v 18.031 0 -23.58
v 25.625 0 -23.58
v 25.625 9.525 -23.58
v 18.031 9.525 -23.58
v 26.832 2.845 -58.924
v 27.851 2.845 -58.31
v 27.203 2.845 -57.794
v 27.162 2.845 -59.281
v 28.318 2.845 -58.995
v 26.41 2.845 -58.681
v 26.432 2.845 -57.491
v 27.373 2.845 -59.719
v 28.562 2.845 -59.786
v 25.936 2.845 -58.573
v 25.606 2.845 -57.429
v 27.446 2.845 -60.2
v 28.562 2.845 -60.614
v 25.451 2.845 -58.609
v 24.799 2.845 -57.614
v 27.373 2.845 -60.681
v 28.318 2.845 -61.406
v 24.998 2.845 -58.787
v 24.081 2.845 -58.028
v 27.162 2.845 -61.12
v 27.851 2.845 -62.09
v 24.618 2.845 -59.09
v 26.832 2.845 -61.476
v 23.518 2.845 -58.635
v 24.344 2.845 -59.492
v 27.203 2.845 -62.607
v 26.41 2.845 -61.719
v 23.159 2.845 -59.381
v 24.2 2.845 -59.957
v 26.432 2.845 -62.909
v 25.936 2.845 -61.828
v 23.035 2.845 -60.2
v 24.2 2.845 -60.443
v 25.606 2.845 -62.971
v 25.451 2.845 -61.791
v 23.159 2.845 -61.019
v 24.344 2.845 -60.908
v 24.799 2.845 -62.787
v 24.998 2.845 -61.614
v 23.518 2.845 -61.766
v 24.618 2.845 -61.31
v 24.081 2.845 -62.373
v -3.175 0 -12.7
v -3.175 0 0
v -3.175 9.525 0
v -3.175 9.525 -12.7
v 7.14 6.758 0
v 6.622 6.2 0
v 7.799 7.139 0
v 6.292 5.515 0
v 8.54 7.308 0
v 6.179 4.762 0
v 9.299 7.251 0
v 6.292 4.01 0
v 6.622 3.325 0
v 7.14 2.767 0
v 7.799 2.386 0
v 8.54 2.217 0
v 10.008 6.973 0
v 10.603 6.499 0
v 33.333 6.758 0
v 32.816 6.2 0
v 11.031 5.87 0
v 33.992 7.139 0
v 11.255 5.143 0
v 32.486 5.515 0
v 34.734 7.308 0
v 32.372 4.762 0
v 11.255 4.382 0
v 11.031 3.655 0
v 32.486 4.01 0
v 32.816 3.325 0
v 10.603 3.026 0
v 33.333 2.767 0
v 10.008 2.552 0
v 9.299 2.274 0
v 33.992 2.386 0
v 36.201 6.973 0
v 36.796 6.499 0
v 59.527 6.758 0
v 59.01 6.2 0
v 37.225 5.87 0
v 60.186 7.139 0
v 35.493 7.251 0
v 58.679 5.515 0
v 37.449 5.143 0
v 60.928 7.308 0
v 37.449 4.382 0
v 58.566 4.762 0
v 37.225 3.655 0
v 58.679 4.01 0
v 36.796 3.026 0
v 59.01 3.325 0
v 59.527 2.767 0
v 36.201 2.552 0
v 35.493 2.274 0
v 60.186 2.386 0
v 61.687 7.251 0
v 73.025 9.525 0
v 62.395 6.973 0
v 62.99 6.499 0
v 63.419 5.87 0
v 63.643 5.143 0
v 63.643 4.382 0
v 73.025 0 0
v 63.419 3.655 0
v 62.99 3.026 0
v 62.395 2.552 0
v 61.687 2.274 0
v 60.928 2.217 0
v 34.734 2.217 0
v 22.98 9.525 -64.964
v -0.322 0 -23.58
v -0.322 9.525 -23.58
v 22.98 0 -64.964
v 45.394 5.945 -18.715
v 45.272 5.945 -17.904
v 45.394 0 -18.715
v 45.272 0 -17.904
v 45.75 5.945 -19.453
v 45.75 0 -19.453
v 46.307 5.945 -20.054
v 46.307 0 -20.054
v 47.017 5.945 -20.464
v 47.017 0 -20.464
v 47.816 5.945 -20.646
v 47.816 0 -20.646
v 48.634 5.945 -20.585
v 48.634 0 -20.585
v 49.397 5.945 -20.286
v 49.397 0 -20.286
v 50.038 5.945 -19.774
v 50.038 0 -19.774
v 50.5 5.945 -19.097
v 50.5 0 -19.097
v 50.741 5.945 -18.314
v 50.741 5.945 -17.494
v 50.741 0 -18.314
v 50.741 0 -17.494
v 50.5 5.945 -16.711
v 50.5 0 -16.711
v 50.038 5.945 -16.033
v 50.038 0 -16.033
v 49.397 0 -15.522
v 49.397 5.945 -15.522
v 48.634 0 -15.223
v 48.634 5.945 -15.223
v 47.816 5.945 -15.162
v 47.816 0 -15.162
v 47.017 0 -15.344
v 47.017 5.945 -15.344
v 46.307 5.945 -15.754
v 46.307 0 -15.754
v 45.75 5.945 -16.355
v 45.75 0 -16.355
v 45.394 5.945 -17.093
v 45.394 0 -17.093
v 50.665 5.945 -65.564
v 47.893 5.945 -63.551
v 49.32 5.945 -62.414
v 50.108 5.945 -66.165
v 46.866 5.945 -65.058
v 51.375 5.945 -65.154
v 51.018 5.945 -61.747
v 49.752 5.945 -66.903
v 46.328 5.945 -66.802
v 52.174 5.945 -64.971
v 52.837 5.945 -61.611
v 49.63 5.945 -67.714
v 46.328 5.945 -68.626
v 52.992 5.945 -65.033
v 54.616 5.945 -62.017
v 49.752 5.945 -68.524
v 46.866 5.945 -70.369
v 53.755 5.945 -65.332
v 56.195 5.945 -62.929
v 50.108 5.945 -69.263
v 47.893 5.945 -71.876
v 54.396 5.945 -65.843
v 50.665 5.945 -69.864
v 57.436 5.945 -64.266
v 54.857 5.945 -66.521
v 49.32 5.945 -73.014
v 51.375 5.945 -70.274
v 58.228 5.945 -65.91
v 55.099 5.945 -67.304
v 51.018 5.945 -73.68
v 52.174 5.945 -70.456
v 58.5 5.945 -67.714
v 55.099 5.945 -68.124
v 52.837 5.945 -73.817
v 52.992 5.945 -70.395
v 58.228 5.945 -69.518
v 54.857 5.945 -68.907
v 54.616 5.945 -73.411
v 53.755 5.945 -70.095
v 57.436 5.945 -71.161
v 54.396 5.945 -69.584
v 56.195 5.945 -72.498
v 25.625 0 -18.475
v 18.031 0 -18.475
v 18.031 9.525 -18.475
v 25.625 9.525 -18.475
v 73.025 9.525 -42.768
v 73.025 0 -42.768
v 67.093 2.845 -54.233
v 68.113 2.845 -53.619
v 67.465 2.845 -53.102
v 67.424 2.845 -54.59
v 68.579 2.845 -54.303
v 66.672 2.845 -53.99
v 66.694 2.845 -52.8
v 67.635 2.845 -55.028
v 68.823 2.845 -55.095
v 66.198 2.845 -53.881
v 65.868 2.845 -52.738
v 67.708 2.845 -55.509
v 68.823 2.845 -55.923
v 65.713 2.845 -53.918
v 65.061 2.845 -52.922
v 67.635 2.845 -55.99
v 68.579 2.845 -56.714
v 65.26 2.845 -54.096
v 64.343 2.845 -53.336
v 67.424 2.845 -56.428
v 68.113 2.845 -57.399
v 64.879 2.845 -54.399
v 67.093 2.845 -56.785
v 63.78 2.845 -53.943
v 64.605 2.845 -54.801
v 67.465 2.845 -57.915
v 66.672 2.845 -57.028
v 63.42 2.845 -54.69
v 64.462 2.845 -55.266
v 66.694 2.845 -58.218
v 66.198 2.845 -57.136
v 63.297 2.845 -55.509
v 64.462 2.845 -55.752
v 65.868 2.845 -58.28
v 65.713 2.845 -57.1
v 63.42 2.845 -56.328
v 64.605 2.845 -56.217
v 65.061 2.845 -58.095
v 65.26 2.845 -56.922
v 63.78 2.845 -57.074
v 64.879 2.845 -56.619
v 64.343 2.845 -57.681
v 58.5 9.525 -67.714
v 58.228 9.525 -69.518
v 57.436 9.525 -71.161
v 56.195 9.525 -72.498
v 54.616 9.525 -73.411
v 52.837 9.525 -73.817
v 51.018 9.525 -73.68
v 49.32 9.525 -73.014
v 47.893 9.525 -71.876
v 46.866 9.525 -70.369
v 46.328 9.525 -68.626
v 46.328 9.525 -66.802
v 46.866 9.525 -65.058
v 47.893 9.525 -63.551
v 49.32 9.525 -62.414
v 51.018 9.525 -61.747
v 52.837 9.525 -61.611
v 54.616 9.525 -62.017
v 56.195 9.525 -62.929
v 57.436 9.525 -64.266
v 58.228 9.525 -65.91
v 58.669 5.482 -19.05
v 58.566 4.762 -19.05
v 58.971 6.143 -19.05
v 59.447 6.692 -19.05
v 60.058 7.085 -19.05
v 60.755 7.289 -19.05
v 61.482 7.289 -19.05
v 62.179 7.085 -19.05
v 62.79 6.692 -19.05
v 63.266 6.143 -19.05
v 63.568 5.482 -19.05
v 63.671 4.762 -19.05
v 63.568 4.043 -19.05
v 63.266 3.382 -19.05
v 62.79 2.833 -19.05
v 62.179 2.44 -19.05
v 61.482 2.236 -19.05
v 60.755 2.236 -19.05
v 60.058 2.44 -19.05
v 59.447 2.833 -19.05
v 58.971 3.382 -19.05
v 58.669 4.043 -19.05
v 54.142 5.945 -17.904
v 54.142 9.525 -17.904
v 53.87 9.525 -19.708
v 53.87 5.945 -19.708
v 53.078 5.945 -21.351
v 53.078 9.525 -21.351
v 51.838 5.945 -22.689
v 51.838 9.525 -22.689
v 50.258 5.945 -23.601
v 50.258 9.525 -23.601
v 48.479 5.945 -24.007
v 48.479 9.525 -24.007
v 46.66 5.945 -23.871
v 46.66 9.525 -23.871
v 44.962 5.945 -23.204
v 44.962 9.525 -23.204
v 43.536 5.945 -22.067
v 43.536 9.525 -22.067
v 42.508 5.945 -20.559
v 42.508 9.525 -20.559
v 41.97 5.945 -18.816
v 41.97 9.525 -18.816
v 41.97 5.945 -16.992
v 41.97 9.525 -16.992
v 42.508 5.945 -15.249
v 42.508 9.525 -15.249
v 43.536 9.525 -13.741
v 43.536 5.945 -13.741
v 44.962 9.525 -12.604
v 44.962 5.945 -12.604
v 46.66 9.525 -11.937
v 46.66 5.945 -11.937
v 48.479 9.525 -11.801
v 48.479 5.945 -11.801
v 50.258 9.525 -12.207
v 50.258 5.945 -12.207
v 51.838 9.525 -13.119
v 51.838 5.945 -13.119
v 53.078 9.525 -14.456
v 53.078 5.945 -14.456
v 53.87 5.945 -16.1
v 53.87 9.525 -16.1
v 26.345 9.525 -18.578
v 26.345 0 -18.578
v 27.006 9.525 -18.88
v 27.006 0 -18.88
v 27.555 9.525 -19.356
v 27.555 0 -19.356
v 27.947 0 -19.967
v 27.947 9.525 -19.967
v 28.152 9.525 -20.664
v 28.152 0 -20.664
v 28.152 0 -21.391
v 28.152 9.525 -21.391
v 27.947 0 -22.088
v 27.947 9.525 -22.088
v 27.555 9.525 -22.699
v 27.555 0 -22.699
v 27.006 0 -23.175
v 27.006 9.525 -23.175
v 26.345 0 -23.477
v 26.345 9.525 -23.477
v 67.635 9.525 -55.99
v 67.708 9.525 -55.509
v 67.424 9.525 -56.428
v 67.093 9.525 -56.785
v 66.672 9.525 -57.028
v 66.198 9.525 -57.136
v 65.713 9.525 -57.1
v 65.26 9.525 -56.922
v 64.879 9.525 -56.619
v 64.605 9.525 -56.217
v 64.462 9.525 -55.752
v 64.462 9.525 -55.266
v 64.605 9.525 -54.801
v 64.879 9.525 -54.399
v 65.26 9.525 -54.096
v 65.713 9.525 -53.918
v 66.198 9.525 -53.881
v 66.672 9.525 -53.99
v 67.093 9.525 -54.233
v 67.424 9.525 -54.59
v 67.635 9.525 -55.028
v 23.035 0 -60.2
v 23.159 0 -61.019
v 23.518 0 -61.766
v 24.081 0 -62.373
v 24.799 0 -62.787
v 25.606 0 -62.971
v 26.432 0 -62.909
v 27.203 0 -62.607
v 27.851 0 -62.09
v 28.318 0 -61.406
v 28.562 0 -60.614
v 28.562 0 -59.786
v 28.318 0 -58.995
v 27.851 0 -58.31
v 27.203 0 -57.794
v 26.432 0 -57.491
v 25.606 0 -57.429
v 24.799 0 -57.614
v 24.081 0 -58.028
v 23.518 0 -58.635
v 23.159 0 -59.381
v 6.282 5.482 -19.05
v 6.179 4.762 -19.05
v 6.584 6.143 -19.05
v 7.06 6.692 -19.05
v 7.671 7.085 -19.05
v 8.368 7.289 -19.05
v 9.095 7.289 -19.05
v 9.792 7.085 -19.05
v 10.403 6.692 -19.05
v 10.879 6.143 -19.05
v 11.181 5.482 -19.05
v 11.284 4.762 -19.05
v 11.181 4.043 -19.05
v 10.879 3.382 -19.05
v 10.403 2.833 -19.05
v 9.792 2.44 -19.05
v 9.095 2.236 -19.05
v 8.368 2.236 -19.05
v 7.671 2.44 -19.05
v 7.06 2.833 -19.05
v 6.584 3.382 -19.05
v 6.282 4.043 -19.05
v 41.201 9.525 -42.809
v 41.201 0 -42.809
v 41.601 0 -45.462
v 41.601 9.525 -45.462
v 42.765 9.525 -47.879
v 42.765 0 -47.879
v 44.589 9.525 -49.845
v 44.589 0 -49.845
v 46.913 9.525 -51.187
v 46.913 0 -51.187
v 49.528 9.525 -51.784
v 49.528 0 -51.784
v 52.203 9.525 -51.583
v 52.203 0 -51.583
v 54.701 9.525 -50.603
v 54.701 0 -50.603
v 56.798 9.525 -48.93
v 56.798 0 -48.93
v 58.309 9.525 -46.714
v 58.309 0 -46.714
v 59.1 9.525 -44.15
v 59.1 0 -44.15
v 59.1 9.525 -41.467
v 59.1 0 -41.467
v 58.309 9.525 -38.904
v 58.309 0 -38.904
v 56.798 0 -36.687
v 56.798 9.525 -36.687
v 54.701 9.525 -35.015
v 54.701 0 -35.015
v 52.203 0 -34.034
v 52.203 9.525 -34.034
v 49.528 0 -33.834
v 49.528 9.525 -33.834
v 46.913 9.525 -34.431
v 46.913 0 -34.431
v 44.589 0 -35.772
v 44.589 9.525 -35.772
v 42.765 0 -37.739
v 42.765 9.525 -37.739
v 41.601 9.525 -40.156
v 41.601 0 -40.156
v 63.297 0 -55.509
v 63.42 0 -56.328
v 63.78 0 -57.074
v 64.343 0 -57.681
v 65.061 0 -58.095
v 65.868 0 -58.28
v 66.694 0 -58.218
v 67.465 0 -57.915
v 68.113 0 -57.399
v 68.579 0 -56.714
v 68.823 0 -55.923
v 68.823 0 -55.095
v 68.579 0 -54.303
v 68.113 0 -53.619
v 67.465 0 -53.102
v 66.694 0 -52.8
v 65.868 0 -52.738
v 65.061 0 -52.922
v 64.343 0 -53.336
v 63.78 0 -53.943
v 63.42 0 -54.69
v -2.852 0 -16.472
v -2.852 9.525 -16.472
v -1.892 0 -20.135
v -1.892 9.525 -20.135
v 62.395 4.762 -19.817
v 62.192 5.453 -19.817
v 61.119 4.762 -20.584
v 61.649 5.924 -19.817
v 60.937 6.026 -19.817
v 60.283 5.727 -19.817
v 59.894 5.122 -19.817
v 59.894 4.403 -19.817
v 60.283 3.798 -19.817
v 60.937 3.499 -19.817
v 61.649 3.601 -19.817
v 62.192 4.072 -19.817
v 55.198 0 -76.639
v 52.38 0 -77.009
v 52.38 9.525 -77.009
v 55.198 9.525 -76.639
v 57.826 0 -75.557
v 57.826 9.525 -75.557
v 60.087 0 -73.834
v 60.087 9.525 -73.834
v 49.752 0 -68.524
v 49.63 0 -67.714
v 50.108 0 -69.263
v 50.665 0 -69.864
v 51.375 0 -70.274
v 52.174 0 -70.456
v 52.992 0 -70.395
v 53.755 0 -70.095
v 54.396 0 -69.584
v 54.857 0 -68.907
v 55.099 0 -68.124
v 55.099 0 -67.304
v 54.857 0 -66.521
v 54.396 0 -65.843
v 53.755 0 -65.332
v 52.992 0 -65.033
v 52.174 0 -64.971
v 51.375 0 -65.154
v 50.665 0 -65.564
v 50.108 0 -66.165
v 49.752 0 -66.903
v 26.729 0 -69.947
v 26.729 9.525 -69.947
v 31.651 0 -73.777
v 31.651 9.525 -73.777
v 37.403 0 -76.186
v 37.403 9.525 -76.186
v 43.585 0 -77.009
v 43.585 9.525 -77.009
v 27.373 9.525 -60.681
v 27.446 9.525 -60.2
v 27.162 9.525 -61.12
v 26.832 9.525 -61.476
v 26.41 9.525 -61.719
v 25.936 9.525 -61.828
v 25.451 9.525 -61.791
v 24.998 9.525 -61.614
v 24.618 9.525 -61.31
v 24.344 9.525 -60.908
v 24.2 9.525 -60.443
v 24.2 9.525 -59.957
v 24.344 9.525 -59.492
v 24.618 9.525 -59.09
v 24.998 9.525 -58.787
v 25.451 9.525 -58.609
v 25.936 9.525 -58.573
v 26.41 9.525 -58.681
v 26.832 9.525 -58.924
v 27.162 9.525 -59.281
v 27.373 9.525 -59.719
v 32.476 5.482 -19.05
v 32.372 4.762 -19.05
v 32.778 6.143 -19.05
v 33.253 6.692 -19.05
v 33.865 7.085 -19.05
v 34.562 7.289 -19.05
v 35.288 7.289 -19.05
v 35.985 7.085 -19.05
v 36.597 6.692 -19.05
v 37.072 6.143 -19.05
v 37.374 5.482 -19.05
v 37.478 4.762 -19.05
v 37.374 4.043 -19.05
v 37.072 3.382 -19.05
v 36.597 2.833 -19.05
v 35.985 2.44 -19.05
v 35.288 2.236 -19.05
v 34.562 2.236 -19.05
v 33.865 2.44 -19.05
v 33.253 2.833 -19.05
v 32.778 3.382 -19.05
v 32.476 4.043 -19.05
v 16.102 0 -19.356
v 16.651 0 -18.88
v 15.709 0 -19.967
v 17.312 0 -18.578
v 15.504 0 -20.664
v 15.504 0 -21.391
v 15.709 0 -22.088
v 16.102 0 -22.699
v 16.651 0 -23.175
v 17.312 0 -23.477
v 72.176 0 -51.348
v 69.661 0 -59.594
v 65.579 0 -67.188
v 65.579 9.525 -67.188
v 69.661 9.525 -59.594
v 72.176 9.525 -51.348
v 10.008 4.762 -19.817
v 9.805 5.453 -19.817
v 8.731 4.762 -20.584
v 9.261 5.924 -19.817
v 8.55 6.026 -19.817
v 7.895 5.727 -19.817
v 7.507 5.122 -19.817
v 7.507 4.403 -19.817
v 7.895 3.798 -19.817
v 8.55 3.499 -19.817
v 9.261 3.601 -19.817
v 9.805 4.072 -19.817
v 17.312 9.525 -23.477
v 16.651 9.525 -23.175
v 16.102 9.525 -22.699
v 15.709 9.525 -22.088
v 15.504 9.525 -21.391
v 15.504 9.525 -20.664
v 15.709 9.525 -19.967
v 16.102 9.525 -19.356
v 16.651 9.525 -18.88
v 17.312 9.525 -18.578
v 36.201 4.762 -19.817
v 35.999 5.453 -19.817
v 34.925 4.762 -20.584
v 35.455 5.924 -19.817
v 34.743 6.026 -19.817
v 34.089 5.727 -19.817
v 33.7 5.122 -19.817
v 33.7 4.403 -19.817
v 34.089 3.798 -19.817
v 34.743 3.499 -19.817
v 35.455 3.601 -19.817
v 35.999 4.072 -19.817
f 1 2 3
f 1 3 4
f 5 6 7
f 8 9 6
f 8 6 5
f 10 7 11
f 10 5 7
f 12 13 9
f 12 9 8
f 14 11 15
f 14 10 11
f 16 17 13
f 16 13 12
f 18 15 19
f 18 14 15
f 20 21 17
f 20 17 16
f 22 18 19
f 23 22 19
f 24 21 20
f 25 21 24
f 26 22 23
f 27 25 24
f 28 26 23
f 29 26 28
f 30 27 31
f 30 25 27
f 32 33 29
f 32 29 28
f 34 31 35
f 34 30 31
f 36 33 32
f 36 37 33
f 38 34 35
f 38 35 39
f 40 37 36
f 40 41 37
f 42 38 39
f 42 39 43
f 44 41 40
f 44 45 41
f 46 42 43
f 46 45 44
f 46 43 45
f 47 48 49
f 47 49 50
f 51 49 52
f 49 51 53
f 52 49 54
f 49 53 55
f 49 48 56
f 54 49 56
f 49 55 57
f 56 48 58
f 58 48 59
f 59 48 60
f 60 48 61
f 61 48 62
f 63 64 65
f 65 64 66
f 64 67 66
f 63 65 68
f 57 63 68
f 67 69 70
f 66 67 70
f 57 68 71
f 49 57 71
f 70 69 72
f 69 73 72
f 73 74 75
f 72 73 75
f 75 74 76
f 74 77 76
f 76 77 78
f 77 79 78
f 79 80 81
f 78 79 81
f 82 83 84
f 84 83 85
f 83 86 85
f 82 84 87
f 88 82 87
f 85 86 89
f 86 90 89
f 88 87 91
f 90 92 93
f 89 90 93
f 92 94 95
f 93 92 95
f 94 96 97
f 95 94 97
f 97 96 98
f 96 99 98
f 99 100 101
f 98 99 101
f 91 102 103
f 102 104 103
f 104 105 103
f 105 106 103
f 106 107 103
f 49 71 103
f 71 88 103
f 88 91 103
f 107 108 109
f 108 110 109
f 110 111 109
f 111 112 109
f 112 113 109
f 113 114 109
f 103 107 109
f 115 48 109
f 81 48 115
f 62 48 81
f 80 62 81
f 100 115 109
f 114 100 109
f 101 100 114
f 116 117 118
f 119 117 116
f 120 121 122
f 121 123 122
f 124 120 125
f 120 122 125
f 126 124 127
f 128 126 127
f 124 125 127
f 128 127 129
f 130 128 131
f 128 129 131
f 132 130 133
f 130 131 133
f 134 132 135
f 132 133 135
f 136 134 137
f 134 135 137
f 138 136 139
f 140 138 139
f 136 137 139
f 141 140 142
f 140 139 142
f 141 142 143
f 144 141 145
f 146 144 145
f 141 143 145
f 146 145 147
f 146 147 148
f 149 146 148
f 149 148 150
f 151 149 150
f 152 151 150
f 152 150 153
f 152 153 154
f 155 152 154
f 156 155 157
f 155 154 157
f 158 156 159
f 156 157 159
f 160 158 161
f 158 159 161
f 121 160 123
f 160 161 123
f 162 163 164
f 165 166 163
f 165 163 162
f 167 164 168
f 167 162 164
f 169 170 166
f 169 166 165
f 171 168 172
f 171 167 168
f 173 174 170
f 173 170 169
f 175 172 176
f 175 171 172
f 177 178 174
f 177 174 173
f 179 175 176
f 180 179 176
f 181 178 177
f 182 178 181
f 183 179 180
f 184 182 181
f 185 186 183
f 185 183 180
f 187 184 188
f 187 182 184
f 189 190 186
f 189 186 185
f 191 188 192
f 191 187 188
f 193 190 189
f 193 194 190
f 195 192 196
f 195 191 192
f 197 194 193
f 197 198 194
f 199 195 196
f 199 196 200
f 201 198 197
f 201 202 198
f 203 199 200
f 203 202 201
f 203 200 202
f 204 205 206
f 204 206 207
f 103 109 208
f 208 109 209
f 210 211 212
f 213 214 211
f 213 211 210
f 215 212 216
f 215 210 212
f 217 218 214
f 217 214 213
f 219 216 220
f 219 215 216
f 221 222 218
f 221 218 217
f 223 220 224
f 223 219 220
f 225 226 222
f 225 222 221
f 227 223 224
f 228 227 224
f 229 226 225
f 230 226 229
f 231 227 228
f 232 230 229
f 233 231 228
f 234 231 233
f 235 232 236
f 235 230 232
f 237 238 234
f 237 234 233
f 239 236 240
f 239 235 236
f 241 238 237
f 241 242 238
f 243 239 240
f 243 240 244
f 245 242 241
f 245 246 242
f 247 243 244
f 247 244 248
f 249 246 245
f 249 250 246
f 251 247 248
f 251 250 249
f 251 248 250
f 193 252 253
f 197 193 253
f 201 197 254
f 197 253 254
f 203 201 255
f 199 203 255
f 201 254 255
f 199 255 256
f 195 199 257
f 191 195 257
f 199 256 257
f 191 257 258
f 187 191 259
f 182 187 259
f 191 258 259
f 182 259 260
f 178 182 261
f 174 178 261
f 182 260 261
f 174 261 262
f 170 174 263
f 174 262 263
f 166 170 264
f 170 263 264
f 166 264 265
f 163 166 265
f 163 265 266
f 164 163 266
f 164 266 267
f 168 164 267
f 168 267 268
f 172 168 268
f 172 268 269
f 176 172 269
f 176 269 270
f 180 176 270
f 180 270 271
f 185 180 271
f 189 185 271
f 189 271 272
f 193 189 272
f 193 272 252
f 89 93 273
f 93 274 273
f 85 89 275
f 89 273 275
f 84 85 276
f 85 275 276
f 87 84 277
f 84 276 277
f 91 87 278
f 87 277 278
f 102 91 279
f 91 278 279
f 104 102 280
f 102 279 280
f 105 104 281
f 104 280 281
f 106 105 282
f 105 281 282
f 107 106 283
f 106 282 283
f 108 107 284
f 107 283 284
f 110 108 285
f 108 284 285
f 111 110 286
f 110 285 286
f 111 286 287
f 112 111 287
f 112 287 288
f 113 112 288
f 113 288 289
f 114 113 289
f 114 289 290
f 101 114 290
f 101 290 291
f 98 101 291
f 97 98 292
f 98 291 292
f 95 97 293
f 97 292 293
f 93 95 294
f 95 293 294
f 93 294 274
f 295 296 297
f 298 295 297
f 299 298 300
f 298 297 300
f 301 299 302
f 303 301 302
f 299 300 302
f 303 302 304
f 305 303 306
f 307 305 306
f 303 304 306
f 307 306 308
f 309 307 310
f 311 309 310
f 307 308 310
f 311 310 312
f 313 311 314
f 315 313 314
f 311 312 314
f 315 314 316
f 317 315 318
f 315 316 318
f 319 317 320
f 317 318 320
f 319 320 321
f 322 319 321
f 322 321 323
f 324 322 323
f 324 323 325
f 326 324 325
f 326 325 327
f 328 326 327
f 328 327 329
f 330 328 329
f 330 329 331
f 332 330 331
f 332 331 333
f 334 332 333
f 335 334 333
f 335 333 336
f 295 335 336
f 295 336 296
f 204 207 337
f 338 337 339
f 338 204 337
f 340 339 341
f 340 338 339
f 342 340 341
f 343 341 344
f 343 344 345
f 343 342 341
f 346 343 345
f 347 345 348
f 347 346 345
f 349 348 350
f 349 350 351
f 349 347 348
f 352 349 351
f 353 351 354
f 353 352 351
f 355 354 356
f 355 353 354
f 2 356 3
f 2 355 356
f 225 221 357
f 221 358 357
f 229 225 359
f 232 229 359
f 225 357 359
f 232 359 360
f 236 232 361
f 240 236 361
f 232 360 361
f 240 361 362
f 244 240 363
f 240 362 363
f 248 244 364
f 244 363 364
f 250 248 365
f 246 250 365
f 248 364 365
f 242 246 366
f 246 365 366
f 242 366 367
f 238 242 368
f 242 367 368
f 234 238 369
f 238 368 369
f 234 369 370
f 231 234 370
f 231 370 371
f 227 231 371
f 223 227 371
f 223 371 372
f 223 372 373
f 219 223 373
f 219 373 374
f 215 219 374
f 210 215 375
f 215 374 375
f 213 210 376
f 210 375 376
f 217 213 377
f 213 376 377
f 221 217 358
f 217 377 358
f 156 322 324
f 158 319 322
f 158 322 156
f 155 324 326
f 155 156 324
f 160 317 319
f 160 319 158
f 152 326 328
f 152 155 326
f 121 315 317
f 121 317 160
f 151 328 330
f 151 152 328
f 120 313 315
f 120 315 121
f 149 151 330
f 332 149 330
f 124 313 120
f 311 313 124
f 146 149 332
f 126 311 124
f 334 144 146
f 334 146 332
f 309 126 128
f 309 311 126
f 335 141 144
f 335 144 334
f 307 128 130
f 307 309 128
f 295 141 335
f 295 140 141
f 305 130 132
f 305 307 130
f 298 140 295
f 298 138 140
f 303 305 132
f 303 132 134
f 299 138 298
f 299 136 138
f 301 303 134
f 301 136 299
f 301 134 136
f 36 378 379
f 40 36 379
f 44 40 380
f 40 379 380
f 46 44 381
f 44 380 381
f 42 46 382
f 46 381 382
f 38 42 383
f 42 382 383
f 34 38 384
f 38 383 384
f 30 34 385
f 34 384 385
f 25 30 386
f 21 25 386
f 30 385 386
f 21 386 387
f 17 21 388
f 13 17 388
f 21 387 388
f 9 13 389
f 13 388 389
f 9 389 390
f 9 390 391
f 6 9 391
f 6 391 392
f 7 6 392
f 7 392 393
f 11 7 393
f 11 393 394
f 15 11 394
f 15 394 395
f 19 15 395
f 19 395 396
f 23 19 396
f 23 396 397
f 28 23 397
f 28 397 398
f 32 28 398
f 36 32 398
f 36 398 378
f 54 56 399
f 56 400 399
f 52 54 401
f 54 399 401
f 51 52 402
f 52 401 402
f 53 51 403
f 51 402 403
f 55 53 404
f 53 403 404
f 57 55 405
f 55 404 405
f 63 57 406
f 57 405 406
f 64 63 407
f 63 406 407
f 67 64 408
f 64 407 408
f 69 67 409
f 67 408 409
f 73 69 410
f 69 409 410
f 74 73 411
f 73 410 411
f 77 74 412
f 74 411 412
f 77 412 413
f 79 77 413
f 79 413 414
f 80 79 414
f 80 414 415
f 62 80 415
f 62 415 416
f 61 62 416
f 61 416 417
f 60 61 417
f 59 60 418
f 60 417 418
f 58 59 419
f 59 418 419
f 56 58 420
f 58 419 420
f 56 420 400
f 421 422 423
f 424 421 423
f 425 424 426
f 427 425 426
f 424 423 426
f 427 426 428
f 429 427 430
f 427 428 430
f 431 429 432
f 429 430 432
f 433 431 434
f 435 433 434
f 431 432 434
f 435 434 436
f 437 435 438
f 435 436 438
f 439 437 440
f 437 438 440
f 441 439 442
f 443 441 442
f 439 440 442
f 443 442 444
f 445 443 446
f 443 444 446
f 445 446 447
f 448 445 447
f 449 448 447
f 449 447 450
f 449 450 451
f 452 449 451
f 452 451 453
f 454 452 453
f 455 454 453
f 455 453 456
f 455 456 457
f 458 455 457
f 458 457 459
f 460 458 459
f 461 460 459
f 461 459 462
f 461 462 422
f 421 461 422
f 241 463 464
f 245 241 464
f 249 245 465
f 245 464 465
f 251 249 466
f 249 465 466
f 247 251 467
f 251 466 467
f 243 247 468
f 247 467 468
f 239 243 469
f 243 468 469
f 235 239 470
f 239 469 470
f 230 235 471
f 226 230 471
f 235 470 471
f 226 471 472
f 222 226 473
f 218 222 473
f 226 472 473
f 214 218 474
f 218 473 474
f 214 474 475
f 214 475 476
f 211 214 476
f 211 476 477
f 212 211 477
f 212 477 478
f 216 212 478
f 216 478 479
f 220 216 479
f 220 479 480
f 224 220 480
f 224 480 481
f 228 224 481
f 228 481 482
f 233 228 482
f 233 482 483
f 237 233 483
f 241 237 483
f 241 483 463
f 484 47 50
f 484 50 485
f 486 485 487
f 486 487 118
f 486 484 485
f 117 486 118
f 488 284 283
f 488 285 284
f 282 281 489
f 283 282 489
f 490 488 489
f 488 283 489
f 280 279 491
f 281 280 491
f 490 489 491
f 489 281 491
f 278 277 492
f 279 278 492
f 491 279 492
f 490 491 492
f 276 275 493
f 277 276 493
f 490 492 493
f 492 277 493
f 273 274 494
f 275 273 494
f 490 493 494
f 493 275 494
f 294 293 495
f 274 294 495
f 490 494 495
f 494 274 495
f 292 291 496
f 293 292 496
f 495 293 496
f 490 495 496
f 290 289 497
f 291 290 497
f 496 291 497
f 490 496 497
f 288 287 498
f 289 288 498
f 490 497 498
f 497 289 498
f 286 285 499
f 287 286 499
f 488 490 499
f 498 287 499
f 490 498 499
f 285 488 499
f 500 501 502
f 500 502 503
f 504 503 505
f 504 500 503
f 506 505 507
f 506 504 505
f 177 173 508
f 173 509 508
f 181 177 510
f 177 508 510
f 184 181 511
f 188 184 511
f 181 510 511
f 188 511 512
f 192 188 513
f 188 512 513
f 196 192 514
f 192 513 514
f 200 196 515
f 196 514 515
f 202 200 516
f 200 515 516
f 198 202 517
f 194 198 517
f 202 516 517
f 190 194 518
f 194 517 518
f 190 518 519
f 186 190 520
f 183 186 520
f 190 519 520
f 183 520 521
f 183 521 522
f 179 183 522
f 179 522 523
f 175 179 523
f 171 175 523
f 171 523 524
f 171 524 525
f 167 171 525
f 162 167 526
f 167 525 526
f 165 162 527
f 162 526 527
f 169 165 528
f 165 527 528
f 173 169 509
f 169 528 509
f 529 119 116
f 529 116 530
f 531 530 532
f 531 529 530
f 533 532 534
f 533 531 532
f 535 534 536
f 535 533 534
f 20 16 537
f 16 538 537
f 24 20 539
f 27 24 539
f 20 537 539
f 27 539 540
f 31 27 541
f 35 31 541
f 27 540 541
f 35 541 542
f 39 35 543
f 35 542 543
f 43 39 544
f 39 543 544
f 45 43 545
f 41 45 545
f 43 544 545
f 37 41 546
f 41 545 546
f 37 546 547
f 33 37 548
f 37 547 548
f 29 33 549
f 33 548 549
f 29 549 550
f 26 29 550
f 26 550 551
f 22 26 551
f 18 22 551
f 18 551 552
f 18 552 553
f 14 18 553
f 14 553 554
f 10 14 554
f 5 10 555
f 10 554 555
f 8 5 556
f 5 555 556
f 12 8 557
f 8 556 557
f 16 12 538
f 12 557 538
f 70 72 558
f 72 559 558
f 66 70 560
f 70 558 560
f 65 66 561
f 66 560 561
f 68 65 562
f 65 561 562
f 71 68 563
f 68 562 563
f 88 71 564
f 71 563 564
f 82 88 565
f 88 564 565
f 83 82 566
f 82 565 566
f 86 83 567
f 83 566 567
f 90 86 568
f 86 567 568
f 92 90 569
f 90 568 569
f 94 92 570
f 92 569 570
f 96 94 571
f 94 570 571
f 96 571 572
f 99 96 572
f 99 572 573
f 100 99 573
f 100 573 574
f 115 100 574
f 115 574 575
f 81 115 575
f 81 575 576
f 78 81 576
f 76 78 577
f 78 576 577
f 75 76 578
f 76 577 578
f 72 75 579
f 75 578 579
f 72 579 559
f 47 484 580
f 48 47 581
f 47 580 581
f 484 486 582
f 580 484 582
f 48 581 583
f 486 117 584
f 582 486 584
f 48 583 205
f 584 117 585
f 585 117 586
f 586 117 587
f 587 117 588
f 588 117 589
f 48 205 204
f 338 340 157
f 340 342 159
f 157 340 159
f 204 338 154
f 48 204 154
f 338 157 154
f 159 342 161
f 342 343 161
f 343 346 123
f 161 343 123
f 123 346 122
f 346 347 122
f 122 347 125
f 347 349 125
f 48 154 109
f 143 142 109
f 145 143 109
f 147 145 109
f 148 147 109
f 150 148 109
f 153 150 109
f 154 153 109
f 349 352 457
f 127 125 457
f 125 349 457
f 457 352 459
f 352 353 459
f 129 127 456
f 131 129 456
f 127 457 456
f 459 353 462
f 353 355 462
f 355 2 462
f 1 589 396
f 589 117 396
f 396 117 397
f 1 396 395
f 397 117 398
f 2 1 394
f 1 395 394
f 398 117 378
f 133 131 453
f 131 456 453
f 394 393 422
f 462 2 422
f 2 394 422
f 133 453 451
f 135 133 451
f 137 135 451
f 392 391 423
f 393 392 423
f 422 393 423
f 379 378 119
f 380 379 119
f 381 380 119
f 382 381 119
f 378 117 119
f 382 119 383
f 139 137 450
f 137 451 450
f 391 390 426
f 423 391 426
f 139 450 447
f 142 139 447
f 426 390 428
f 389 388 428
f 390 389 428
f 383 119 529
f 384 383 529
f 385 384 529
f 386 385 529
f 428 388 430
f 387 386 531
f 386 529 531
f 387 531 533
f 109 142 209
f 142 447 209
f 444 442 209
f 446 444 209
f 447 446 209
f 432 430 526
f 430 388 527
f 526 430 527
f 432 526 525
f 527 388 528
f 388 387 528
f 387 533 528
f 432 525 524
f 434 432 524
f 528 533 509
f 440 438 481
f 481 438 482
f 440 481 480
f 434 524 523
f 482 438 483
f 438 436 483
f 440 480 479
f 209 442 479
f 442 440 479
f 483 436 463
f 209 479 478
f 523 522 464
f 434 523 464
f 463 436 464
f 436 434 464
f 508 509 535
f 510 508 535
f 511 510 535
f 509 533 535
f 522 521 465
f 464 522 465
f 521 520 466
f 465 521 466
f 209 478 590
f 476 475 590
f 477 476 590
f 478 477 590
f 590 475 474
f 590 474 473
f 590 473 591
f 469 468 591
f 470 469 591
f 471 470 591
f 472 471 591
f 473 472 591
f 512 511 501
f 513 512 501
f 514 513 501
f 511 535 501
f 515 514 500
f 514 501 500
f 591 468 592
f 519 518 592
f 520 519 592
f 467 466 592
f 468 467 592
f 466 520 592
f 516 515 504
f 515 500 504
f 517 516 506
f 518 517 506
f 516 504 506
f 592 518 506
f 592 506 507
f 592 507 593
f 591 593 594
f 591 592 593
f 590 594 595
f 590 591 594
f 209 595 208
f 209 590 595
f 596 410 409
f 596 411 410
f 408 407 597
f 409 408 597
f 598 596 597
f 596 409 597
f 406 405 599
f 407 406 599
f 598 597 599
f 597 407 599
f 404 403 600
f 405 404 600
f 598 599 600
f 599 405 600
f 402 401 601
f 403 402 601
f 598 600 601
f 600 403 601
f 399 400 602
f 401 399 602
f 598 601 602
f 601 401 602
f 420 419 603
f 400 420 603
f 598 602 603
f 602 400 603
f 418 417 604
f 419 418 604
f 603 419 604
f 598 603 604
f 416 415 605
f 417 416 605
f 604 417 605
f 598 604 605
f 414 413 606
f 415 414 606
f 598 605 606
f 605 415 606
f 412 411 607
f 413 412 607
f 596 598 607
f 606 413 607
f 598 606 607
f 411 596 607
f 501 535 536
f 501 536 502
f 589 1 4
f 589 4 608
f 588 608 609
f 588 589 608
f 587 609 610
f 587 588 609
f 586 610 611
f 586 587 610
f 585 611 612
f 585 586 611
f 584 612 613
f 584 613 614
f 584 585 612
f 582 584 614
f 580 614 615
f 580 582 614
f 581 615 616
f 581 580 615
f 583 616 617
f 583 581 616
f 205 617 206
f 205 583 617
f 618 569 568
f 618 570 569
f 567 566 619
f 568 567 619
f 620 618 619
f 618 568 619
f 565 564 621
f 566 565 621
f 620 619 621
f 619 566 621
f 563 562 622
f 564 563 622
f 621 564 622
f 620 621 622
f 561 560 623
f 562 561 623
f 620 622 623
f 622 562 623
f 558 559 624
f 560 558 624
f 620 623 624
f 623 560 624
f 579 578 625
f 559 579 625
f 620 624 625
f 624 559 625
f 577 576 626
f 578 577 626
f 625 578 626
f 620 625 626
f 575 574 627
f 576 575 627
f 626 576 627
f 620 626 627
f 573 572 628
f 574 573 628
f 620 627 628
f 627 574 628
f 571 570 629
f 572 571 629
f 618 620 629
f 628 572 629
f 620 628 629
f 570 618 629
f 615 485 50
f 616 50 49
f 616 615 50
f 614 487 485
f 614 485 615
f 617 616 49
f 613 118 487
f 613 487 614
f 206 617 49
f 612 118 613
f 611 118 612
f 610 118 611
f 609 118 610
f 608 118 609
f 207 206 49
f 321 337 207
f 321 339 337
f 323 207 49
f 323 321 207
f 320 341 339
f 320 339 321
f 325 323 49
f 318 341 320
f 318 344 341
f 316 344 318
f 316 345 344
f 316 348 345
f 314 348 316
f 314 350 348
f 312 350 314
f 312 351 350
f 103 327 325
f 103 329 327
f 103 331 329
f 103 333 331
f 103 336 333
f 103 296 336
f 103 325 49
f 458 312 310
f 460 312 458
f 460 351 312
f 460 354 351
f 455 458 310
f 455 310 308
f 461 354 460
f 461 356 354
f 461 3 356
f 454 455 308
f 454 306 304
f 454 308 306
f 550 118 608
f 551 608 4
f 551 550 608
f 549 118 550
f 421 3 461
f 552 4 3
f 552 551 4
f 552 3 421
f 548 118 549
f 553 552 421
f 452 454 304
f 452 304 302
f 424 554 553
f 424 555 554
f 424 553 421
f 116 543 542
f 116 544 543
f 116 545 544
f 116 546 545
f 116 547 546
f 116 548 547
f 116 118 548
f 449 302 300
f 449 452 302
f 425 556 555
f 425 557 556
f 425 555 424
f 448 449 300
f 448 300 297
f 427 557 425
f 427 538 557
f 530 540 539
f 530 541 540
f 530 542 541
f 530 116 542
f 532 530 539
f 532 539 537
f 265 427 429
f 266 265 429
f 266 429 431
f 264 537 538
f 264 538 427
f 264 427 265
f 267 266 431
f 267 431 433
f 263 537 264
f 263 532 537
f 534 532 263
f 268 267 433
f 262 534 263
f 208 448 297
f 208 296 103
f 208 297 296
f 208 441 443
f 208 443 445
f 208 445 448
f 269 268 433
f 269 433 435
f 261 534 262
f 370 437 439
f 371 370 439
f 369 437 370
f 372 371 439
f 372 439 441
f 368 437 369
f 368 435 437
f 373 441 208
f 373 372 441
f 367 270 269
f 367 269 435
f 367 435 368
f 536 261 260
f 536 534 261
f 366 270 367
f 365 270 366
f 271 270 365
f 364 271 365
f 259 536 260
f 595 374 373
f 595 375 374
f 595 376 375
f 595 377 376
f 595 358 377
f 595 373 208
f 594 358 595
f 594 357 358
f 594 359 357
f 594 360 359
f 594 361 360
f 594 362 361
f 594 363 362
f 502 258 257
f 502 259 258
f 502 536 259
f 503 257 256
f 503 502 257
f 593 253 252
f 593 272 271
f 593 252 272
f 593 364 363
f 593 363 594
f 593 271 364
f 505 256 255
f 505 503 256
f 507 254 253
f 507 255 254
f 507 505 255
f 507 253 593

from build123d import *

# Parameters (mm, degrees)
SKETCH1_W                                      = 69.85
SKETCH1_H                                      = 101.6
BOSS_EXTRUDE1_DEPTH                            = 9.525
F_1_4_20_TAPPED_HOLE1_D                        = 5.1054
F_1_4_20_TAPPED_HOLE1_DEPTH                    = 19.05
F_1_4_20_TAPPED_HOLE1_TIP                      = 1.533816902
F_18_0_18_DIAMETER_HOLE1_D                     = 18
CBORE_FOR_M5_HEX_HEAD_BOLT1_D                  = 5.5
CBORE_FOR_M5_HEX_HEAD_BOLT1_CBORE_D            = 12.24
CBORE_FOR_M5_HEX_HEAD_BOLT1_CBORE_DEPTH        = 3.58
CBORE_FOR_4_SOCKET_HEAD_CAP_SCREW1_D           = 3.2639
CBORE_FOR_4_SOCKET_HEAD_CAP_SCREW1_CBORE_D     = 5.55752
CBORE_FOR_4_SOCKET_HEAD_CAP_SCREW1_CBORE_DEPTH = 2.8448
F_10_CLEARANCE_SLOT1_DEPTH                     = 9.525
SKETCH23_W                                     = 3.175
SKETCH23_H                                     = 101.6
BOSS_EXTRUDE2_DEPTH                            = 9.525
CUT_EXTRUDE2_DEPTH                             = 126.482812568


# Read off the part's stored shape, not the designer's step: #10 Clearance Slot1
with BuildPart() as part:
    # Sketch1 → Boss-Extrude1 (new body)
    with BuildSketch(Plane(origin=(0, 0, 0), x_dir=(1, 0, 0), z_dir=(0, 1, 0))):
        with Locations((34.925, 50.8)):
            Rectangle(SKETCH1_W, SKETCH1_H)
    extrude(amount=BOSS_EXTRUDE1_DEPTH)

    # 1/4-20 Tapped Hole1
    with Locations(Plane.XY):
        with Locations((8.73125, 4.7625), (61.11875, 4.7625), (34.925, 4.7625)):
            Hole(F_1_4_20_TAPPED_HOLE1_D / 2, depth=F_1_4_20_TAPPED_HOLE1_DEPTH)
            with Locations((0, 0, -(F_1_4_20_TAPPED_HOLE1_DEPTH + F_1_4_20_TAPPED_HOLE1_TIP / 2))):  # 118° drill point
                Cone(0, F_1_4_20_TAPPED_HOLE1_D / 2, F_1_4_20_TAPPED_HOLE1_TIP, mode=Mode.SUBTRACT)

    # Ø18.0 (18) Diameter Hole1 (through all)
    with Locations(Plane(origin=(0, 9.525, 0), x_dir=(1, 0, 0), z_dir=(0, 1, 0))):
        with Locations((50.200768572, 42.808816902)):
            Hole(F_18_0_18_DIAMETER_HOLE1_D / 2)

    # CBORE for M5 Hex Head Bolt1 (through all)
    with Locations(Plane(origin=(0, 9.525, 0), x_dir=(1, 0, 0), z_dir=(0, 1, 0))):
        with Locations((52.379662144, 67.713684392), (48.021875, 17.903949412)):
            CounterBoreHole(CBORE_FOR_M5_HEX_HEAD_BOLT1_D / 2, CBORE_FOR_M5_HEX_HEAD_BOLT1_CBORE_D / 2, CBORE_FOR_M5_HEX_HEAD_BOLT1_CBORE_DEPTH)

    # CBORE for #4 Socket Head Cap Screw1 (through all)
    with Locations(Plane(origin=(0, 0, 0), x_dir=(-1, 0, 0), z_dir=(0, -1, 0))):
        with Locations((-25.814021811, 60.200257539), (-66.075768572, 55.508816902)):
            CounterBoreHole(CBORE_FOR_4_SOCKET_HEAD_CAP_SCREW1_D / 2, CBORE_FOR_4_SOCKET_HEAD_CAP_SCREW1_CBORE_D / 2, CBORE_FOR_4_SOCKET_HEAD_CAP_SCREW1_CBORE_DEPTH)

    # #10 Clearance Slot1 outline → #10 Clearance Slot1 (cut)
    with BuildSketch(Plane(origin=(0, 0, 0), x_dir=(1, 0, 0), z_dir=(0, 1, 0))):
        with BuildLine():
            Line((18.030825, 18.474656367), (25.625425, 18.474656367))
            ThreePointArc((25.625425, 18.474656367), (28.178125, 21.027356367), (25.625425, 23.580056367))
            Line((25.625425, 23.580056367), (18.030825, 23.580056367))
            ThreePointArc((18.030825, 23.580056367), (15.478125, 21.027356367), (18.030825, 18.474656367))
        make_face()
    extrude(amount=F_10_CLEARANCE_SLOT1_DEPTH, mode=Mode.SUBTRACT)

    # Sketch23 → Boss-Extrude2 (add)
    with BuildSketch(Plane(origin=(0, 0, 0), x_dir=(1, 0, 0), z_dir=(0, 1, 0))):
        with Locations((71.4375, 50.8)):
            Rectangle(SKETCH23_W, SKETCH23_H)
        with Locations((-1.5875, 50.8)):
            Rectangle(SKETCH23_W, SKETCH23_H)
    extrude(amount=BOSS_EXTRUDE2_DEPTH)

    # Sketch24 → Cut-Extrude2 (cut, through all)
    with BuildSketch(Plane(origin=(0, 0, 0), x_dir=(1, 0, 0), z_dir=(0, 1, 0))):
        with BuildLine():
            ThreePointArc((60.086847532, 73.833684392), (69.661188781, 59.594122619), (73.025, 42.768014811))
            Line((73.025, 42.768014811), (73.025, 101.6))
            Line((73.025, 101.6), (-3.175, 101.6))
            Line((-3.175, 101.6), (-3.175, 12.7))
            ThreePointArc((-3.175, 12.7), (-2.45000516, 18.323895492), (-0.322426517, 23.580056367))
            Line((-0.322426517, 23.580056367), (22.97958653, 64.963684392))
            ThreePointArc((22.97958653, 64.963684392), (31.651165616, 73.776549238), (43.584990358, 77.008684392))
            Line((43.584990358, 77.008684392), (52.379662144, 77.008684392))
            ThreePointArc((52.379662144, 77.008684392), (56.547435278, 76.183844834), (60.086847532, 73.833684392))
        make_face()
    extrude(amount=CUT_EXTRUDE2_DEPTH, mode=Mode.SUBTRACT)


solid = part.part
